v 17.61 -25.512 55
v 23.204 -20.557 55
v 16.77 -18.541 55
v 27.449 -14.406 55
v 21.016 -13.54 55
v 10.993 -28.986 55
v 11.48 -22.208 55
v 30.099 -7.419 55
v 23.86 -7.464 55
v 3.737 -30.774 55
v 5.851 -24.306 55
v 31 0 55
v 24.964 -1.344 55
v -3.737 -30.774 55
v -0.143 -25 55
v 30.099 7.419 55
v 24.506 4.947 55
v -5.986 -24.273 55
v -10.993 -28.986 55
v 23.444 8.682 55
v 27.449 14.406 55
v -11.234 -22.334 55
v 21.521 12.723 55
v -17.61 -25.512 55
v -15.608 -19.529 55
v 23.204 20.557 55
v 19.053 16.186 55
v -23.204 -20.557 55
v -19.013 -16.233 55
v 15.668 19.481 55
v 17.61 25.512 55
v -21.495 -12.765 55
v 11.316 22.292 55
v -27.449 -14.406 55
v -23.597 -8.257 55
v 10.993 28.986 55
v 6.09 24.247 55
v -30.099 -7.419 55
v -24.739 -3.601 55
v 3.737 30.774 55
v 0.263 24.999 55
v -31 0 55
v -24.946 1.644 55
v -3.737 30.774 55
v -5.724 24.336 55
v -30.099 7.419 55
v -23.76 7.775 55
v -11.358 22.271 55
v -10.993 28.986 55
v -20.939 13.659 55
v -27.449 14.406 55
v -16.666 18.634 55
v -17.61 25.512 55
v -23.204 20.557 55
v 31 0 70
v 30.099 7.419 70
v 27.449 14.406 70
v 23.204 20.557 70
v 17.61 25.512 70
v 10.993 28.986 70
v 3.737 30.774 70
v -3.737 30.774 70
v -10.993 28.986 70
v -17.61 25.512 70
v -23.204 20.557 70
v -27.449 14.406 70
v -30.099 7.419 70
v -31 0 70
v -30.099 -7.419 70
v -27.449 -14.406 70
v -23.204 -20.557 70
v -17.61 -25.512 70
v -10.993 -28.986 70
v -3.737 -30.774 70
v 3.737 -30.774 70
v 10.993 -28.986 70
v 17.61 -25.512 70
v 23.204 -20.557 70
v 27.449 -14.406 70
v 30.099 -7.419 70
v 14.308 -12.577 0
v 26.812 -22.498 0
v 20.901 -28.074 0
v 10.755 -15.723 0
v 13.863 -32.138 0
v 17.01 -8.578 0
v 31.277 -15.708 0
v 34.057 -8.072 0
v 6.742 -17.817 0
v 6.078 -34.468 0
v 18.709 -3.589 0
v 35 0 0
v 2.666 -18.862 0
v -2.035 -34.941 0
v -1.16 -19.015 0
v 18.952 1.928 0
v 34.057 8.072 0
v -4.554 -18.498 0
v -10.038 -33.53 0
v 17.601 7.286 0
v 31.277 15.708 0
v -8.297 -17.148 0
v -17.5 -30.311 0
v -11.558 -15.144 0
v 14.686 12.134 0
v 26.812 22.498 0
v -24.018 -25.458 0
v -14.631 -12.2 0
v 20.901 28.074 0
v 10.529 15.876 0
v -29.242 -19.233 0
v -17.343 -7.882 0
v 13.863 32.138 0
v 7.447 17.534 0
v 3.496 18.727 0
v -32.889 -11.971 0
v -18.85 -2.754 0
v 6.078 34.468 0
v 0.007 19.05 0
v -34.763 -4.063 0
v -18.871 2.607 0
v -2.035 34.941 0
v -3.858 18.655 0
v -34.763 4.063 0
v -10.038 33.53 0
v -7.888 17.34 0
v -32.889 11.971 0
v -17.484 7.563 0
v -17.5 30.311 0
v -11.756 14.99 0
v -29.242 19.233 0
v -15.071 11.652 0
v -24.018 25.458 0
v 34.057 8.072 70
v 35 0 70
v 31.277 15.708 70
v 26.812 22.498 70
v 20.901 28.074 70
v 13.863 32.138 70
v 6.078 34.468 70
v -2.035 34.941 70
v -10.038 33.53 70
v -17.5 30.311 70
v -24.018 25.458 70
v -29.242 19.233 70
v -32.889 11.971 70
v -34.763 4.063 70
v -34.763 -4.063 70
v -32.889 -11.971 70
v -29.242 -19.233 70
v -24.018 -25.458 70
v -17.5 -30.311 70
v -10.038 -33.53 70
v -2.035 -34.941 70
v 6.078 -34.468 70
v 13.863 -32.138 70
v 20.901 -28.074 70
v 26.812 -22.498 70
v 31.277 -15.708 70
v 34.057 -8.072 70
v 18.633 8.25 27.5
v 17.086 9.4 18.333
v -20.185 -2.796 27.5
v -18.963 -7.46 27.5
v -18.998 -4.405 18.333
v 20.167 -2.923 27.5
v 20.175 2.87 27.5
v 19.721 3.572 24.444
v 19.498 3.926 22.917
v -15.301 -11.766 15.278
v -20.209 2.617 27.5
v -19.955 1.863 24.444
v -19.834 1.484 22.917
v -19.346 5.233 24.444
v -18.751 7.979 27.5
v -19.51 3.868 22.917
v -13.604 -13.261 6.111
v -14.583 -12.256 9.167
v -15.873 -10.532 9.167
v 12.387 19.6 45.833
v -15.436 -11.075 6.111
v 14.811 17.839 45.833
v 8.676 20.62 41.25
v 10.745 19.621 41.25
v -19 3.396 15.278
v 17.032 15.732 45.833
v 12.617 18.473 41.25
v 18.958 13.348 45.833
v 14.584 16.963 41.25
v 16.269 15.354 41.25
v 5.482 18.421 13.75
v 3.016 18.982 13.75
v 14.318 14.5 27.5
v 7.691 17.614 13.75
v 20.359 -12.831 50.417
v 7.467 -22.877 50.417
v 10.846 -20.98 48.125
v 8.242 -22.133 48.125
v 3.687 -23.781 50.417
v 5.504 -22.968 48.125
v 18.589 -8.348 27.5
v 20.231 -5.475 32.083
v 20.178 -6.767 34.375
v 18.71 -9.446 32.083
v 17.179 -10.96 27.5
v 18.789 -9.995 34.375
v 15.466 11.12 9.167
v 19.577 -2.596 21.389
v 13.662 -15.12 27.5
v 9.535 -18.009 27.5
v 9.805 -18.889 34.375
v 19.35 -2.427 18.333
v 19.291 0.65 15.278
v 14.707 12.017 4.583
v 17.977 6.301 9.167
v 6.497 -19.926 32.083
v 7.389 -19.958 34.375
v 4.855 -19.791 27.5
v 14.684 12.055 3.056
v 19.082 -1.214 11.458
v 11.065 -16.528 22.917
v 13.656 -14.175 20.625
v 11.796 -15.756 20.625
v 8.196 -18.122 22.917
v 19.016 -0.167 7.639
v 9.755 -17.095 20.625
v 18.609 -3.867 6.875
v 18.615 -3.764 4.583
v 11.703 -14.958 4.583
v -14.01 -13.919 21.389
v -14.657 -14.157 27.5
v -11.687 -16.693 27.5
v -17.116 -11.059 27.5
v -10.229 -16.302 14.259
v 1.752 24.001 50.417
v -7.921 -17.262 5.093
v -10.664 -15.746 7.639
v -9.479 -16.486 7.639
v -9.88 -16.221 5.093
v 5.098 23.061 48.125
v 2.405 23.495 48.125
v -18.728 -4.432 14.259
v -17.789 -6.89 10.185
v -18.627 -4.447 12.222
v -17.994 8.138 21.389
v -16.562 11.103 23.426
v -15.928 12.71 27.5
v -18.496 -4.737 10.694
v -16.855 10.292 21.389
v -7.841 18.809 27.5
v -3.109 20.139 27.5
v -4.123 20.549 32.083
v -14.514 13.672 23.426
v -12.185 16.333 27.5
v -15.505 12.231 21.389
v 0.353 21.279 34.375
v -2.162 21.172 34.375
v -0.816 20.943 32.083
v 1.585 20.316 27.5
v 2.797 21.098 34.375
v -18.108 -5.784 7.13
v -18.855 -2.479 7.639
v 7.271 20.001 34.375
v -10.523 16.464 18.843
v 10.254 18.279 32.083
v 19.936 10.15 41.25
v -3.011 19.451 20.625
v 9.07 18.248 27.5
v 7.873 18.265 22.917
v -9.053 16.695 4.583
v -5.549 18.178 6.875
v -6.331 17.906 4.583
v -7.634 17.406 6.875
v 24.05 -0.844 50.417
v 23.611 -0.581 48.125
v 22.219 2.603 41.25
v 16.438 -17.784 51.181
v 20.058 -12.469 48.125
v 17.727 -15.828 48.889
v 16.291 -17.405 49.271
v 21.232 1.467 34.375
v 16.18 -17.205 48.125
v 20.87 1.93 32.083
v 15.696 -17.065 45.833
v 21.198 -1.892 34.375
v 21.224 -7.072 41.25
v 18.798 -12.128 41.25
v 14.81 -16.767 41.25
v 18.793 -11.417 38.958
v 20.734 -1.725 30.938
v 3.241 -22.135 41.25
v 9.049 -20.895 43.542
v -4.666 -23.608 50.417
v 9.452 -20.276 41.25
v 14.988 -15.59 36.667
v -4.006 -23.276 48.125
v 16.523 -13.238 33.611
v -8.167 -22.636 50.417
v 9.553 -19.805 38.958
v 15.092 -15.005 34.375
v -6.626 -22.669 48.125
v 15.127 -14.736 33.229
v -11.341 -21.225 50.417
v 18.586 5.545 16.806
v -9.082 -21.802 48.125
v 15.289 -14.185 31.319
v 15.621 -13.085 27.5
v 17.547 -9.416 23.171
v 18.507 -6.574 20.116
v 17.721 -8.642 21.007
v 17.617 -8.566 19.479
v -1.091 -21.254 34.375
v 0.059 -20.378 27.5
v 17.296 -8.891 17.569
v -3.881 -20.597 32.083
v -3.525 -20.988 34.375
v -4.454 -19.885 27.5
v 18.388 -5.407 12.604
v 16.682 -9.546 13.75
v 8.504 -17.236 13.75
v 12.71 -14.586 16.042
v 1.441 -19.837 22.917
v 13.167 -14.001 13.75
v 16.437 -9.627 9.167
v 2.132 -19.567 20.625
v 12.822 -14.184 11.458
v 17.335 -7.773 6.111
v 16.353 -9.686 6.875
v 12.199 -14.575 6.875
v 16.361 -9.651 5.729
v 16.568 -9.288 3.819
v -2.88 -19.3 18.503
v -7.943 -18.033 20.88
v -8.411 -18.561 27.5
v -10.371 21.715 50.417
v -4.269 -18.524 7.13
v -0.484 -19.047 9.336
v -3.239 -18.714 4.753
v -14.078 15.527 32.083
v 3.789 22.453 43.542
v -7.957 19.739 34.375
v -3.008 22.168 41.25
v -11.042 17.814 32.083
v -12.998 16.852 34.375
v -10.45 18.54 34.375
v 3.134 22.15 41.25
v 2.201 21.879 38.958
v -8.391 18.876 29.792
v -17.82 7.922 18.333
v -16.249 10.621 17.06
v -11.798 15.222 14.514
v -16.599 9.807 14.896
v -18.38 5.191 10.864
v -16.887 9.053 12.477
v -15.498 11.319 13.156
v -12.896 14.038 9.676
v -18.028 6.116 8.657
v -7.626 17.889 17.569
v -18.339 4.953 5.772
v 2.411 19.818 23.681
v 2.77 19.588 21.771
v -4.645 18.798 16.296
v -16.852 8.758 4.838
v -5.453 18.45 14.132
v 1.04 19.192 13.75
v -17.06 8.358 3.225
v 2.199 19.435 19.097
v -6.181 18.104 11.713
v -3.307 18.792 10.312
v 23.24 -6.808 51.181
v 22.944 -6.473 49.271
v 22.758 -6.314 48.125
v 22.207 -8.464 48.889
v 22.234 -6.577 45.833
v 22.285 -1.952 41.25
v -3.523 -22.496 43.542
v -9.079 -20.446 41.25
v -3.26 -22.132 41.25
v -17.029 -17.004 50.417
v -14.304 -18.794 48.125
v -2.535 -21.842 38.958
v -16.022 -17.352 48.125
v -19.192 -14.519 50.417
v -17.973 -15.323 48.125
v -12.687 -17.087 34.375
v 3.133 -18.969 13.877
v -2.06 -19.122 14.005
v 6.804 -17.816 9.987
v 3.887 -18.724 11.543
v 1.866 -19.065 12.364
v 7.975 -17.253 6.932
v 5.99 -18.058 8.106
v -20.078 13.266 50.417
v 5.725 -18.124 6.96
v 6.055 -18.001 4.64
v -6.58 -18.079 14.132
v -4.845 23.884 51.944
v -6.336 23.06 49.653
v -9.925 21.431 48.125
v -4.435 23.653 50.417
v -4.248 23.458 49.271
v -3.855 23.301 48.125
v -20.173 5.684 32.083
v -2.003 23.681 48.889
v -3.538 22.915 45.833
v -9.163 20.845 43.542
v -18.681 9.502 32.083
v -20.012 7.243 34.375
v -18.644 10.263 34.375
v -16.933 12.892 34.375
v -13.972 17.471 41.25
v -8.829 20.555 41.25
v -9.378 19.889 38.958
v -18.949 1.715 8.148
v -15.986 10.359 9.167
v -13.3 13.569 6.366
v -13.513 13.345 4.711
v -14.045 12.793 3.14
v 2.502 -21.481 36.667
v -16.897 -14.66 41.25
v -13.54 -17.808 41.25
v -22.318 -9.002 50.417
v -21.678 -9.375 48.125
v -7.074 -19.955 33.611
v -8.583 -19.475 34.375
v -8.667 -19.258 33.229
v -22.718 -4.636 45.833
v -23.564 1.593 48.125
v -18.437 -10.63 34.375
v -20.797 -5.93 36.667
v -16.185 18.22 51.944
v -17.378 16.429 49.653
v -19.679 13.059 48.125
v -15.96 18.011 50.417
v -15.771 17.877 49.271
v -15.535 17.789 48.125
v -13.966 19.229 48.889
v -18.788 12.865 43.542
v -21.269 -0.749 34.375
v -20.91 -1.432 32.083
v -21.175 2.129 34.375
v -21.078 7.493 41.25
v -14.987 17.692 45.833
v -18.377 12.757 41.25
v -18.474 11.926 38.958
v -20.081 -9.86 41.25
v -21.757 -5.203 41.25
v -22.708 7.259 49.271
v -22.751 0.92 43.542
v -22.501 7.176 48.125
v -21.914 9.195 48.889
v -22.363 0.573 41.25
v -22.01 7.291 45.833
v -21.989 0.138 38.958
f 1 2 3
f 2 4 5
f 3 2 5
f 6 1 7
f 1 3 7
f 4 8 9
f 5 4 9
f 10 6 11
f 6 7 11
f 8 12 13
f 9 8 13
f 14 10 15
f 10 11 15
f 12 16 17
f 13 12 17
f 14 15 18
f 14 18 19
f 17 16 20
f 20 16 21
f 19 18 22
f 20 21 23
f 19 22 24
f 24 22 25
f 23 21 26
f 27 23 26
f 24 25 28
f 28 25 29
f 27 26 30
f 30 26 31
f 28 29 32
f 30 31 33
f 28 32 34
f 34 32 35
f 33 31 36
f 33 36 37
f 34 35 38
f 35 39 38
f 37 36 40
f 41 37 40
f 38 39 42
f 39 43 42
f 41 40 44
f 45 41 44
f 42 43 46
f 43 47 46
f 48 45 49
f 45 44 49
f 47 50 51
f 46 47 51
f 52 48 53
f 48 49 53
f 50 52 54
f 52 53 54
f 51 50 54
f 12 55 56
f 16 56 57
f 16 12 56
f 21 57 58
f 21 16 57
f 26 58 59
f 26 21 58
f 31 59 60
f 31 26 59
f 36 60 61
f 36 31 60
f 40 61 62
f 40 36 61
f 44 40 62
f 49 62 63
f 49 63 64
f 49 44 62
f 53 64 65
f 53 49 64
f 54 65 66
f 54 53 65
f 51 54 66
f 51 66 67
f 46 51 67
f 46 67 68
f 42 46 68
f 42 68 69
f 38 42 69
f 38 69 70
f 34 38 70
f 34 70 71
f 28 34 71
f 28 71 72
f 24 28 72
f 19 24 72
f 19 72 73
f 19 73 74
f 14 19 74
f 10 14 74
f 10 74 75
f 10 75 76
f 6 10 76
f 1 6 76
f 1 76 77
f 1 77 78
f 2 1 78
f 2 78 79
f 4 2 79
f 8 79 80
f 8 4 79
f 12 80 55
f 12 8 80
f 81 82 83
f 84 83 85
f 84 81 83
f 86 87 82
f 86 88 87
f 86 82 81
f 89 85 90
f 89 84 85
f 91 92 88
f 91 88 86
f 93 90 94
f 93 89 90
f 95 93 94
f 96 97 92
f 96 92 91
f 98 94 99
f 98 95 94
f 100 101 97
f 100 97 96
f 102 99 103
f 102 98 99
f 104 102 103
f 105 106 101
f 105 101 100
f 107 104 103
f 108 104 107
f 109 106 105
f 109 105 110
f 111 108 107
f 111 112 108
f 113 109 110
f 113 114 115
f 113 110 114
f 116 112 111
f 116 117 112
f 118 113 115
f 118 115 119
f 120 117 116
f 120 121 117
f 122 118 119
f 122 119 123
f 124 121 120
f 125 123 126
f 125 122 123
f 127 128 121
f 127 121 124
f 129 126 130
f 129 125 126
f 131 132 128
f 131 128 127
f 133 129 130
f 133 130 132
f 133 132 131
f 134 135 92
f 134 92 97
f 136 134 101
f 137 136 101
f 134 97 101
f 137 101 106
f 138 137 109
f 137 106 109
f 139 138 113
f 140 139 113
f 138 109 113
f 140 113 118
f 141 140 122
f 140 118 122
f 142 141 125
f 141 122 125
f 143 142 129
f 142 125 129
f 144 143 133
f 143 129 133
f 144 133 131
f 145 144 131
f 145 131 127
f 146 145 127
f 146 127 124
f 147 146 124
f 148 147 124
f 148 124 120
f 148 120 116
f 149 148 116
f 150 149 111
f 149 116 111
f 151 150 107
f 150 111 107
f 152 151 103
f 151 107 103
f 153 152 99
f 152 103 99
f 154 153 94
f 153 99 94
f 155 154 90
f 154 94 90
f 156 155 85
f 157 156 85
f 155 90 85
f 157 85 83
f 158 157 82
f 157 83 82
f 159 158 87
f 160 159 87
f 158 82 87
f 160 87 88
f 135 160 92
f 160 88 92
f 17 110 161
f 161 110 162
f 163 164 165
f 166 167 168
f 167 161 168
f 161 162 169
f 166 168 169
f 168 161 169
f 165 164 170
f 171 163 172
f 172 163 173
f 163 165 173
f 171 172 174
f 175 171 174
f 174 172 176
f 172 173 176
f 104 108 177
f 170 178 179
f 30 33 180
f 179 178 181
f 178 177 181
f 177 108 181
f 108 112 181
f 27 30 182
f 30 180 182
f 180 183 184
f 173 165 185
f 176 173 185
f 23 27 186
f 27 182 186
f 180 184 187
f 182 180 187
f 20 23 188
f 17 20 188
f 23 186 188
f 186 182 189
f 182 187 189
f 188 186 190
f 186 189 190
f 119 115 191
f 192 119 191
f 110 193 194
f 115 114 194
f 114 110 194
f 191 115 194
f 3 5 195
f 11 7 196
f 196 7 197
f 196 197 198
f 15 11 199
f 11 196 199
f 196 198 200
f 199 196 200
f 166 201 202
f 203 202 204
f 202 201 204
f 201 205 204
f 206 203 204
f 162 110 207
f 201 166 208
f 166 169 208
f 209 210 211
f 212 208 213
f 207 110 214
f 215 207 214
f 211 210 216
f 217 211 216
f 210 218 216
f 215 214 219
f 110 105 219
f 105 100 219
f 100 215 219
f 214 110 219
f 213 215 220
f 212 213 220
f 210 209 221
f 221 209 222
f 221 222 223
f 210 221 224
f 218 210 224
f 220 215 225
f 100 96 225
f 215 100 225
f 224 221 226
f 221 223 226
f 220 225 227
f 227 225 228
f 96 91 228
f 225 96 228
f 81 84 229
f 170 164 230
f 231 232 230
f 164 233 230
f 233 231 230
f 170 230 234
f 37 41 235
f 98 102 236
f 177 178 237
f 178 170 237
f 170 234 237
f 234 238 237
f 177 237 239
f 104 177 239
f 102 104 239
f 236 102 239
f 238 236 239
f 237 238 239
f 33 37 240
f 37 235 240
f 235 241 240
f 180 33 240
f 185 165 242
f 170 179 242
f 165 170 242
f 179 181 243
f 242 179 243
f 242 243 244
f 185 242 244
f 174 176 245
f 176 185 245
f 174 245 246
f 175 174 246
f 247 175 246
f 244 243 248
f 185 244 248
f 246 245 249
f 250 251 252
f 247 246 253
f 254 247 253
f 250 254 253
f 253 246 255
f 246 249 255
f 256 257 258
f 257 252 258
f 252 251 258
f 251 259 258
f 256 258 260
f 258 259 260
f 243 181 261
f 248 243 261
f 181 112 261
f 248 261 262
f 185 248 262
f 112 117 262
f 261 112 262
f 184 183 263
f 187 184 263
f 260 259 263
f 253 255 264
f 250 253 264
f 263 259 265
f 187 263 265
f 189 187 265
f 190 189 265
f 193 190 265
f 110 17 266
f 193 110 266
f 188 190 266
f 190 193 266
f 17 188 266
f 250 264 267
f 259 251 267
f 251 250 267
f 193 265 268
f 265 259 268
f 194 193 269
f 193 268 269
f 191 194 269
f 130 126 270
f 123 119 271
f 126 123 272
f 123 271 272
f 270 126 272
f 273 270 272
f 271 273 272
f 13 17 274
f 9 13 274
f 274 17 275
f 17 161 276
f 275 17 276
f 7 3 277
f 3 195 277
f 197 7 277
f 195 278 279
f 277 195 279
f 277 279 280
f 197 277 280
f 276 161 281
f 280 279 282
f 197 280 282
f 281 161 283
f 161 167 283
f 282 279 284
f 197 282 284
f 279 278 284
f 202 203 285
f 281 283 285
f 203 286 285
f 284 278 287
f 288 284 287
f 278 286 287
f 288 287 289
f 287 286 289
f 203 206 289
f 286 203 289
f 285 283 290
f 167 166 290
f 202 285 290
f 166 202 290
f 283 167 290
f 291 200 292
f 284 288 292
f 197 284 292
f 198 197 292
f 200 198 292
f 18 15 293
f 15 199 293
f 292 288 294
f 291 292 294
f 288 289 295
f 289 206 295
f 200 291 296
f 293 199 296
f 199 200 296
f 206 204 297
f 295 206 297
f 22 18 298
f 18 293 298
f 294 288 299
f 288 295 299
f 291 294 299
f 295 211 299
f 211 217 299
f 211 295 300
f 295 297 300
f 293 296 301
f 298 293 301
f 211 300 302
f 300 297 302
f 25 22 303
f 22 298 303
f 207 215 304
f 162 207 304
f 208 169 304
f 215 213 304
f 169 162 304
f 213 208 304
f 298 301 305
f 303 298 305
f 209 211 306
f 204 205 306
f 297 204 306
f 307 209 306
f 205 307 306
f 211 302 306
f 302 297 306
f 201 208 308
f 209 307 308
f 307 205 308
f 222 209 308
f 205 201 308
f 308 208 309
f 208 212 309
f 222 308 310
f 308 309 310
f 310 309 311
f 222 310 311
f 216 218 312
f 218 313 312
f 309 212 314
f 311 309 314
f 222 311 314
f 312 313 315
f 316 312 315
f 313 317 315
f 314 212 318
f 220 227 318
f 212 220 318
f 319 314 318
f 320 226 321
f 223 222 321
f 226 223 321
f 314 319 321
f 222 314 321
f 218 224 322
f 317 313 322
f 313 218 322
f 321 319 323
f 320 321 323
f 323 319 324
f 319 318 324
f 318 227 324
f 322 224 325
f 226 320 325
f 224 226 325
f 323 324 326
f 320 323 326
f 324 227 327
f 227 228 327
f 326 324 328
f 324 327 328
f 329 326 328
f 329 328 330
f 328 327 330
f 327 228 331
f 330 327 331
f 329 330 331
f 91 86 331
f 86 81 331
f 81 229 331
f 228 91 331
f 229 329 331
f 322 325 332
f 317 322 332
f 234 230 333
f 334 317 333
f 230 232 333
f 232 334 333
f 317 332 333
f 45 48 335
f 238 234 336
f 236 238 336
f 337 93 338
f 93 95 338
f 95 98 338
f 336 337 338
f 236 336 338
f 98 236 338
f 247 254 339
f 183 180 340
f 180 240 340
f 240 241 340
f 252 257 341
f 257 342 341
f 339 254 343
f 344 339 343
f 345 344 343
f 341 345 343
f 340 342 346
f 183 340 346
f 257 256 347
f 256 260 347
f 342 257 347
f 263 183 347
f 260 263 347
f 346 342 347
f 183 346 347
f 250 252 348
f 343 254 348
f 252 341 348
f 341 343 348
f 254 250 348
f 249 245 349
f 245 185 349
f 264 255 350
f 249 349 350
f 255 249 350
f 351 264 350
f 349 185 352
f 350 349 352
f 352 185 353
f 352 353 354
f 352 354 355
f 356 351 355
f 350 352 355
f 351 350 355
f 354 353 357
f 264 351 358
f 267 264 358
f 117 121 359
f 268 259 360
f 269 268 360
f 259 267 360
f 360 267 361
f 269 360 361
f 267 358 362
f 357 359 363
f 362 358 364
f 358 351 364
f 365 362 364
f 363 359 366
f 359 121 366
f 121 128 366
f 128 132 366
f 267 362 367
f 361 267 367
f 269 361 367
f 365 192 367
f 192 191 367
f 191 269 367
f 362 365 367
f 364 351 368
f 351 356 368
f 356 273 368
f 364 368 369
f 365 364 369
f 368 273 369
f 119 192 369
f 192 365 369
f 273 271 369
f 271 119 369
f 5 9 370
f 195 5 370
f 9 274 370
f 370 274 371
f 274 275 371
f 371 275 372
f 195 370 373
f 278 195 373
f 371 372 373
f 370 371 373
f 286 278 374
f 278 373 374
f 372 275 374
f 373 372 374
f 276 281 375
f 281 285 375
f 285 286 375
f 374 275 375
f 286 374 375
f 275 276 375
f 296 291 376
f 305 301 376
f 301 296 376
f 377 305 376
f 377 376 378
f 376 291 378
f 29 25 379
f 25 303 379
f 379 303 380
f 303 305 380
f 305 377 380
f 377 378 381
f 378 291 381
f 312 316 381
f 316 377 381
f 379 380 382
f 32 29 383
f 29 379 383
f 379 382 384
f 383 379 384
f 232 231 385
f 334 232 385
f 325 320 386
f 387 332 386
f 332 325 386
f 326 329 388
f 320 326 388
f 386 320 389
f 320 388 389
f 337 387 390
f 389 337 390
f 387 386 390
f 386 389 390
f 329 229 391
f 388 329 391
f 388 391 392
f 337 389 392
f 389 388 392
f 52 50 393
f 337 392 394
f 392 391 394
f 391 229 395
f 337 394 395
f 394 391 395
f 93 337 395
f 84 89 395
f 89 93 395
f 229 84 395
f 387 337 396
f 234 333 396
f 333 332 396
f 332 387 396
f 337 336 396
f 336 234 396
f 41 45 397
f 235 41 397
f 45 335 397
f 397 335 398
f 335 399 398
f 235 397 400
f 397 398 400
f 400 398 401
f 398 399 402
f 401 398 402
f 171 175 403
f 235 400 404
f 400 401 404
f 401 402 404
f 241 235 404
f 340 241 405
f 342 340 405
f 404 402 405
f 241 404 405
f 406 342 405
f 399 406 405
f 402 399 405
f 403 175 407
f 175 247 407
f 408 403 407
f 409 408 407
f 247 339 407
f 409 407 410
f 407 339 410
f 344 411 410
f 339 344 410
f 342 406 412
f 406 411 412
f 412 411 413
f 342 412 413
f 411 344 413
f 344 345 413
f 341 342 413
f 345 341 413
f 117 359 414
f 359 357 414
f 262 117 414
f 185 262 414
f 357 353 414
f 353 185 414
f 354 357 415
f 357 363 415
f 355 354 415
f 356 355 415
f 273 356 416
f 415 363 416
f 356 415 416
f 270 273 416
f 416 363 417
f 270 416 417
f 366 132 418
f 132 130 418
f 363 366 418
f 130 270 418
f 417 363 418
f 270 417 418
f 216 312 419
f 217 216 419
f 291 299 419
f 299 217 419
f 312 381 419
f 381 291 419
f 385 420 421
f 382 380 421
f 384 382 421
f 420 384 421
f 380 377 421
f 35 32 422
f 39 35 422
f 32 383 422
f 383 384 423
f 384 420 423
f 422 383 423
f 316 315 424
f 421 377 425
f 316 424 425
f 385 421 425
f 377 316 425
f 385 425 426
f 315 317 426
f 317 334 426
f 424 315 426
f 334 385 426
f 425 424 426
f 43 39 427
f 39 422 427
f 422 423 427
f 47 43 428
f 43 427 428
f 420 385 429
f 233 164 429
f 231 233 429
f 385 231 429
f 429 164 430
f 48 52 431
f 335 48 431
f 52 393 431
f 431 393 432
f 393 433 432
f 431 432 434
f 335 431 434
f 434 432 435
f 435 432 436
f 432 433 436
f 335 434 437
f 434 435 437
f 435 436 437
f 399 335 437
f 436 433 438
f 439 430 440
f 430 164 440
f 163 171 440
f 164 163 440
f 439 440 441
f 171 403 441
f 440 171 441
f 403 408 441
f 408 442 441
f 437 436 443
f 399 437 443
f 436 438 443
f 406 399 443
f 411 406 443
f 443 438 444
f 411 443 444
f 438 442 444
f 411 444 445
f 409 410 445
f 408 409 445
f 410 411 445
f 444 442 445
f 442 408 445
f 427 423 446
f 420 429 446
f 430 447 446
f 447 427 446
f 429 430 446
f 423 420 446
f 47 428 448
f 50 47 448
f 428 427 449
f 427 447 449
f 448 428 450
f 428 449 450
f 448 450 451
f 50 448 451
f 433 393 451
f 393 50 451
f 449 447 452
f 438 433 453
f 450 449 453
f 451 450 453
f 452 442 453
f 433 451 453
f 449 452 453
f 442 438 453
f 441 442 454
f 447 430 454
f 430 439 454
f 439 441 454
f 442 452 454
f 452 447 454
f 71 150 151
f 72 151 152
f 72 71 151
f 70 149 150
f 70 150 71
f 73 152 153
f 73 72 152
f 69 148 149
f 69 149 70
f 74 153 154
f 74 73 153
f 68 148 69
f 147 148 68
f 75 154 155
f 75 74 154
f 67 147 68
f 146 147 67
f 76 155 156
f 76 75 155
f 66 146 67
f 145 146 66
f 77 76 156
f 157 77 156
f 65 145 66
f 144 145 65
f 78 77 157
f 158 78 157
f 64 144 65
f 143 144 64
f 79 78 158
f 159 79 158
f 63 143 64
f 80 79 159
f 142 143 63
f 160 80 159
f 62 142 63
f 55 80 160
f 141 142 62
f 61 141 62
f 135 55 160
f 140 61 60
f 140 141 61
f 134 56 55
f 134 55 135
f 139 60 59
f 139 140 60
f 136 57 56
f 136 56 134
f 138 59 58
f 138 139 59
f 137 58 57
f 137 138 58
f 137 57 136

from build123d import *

# Parameters (mm, degrees)
CROQUIS1_R              = 35
CROQUIS1_R_2            = 31
SALIENTE_EXTRUIR1_DEPTH = 70
CROQUIS2_R              = 31
SALIENTE_EXTRUIR2_DEPTH = 55


with BuildPart() as part:
    # Croquis1 → Saliente-Extruir1 (new body)
    with BuildSketch(Plane.XY):
        Circle(CROQUIS1_R)
        Circle(CROQUIS1_R_2, mode=Mode.SUBTRACT)
    extrude(amount=SALIENTE_EXTRUIR1_DEPTH)

    # Croquis2 → Saliente-Extruir2 (add)
    with BuildSketch(Plane(origin=(0, 0, 0), x_dir=(-1, 0, 0), z_dir=(0, 0, -1))):
        Circle(CROQUIS2_R)
    extrude(amount=-SALIENTE_EXTRUIR2_DEPTH)

    # Cortar-Recubrir2: read off the stored shape, not the designer's step
    # Cortar-Recubrir2: loft between two sections, ruled curve by curve
    cortar_recubrir2_from = [
        Edge.make_bspline([(24.505743897, 4.946566089, 55), (34.398876075, -44.064921704, 55), (-14.612611719, -53.958053882, 55), (-24.505743897, -4.946566089, 55), (-34.398876075, 44.064921704, 55), (14.612611719, 53.958053882, 55), (24.505743897, 4.946566089, 55)], [0, 0, 0, 0, 0.5, 0.5, 0.5, 1, 1, 1, 1], 3, [1, 0.333333333, 0.333333333, 1, 0.333333333, 0.333333333, 1]),
    ]
    cortar_recubrir2_to = [
        Edge.make_bspline([(10.528812483, 15.875975803, 0), (42.280764089, -5.181649163, 0), (21.223139123, -36.933600769, 0), (-10.528812483, -15.875975803, 0), (-42.280764089, 5.181649163, 0), (-21.223139123, 36.933600769, 0), (10.528812483, 15.875975803, 0)], [0, 0, 0, 0, 0.5, 0.5, 0.5, 1, 1, 1, 1], 3, [1, 0.333333333, 0.333333333, 1, 0.333333333, 0.333333333, 1]),
    ]
    cortar_recubrir2 = Solid(Shell([*[Face.make_surface_from_curves(cortar_recubrir2_from[k], cortar_recubrir2_to[k]) for k in range(1)], Face(Wire(cortar_recubrir2_from)), Face(Wire(cortar_recubrir2_to))]))
    add(cortar_recubrir2, mode=Mode.SUBTRACT)


solid = part.part
